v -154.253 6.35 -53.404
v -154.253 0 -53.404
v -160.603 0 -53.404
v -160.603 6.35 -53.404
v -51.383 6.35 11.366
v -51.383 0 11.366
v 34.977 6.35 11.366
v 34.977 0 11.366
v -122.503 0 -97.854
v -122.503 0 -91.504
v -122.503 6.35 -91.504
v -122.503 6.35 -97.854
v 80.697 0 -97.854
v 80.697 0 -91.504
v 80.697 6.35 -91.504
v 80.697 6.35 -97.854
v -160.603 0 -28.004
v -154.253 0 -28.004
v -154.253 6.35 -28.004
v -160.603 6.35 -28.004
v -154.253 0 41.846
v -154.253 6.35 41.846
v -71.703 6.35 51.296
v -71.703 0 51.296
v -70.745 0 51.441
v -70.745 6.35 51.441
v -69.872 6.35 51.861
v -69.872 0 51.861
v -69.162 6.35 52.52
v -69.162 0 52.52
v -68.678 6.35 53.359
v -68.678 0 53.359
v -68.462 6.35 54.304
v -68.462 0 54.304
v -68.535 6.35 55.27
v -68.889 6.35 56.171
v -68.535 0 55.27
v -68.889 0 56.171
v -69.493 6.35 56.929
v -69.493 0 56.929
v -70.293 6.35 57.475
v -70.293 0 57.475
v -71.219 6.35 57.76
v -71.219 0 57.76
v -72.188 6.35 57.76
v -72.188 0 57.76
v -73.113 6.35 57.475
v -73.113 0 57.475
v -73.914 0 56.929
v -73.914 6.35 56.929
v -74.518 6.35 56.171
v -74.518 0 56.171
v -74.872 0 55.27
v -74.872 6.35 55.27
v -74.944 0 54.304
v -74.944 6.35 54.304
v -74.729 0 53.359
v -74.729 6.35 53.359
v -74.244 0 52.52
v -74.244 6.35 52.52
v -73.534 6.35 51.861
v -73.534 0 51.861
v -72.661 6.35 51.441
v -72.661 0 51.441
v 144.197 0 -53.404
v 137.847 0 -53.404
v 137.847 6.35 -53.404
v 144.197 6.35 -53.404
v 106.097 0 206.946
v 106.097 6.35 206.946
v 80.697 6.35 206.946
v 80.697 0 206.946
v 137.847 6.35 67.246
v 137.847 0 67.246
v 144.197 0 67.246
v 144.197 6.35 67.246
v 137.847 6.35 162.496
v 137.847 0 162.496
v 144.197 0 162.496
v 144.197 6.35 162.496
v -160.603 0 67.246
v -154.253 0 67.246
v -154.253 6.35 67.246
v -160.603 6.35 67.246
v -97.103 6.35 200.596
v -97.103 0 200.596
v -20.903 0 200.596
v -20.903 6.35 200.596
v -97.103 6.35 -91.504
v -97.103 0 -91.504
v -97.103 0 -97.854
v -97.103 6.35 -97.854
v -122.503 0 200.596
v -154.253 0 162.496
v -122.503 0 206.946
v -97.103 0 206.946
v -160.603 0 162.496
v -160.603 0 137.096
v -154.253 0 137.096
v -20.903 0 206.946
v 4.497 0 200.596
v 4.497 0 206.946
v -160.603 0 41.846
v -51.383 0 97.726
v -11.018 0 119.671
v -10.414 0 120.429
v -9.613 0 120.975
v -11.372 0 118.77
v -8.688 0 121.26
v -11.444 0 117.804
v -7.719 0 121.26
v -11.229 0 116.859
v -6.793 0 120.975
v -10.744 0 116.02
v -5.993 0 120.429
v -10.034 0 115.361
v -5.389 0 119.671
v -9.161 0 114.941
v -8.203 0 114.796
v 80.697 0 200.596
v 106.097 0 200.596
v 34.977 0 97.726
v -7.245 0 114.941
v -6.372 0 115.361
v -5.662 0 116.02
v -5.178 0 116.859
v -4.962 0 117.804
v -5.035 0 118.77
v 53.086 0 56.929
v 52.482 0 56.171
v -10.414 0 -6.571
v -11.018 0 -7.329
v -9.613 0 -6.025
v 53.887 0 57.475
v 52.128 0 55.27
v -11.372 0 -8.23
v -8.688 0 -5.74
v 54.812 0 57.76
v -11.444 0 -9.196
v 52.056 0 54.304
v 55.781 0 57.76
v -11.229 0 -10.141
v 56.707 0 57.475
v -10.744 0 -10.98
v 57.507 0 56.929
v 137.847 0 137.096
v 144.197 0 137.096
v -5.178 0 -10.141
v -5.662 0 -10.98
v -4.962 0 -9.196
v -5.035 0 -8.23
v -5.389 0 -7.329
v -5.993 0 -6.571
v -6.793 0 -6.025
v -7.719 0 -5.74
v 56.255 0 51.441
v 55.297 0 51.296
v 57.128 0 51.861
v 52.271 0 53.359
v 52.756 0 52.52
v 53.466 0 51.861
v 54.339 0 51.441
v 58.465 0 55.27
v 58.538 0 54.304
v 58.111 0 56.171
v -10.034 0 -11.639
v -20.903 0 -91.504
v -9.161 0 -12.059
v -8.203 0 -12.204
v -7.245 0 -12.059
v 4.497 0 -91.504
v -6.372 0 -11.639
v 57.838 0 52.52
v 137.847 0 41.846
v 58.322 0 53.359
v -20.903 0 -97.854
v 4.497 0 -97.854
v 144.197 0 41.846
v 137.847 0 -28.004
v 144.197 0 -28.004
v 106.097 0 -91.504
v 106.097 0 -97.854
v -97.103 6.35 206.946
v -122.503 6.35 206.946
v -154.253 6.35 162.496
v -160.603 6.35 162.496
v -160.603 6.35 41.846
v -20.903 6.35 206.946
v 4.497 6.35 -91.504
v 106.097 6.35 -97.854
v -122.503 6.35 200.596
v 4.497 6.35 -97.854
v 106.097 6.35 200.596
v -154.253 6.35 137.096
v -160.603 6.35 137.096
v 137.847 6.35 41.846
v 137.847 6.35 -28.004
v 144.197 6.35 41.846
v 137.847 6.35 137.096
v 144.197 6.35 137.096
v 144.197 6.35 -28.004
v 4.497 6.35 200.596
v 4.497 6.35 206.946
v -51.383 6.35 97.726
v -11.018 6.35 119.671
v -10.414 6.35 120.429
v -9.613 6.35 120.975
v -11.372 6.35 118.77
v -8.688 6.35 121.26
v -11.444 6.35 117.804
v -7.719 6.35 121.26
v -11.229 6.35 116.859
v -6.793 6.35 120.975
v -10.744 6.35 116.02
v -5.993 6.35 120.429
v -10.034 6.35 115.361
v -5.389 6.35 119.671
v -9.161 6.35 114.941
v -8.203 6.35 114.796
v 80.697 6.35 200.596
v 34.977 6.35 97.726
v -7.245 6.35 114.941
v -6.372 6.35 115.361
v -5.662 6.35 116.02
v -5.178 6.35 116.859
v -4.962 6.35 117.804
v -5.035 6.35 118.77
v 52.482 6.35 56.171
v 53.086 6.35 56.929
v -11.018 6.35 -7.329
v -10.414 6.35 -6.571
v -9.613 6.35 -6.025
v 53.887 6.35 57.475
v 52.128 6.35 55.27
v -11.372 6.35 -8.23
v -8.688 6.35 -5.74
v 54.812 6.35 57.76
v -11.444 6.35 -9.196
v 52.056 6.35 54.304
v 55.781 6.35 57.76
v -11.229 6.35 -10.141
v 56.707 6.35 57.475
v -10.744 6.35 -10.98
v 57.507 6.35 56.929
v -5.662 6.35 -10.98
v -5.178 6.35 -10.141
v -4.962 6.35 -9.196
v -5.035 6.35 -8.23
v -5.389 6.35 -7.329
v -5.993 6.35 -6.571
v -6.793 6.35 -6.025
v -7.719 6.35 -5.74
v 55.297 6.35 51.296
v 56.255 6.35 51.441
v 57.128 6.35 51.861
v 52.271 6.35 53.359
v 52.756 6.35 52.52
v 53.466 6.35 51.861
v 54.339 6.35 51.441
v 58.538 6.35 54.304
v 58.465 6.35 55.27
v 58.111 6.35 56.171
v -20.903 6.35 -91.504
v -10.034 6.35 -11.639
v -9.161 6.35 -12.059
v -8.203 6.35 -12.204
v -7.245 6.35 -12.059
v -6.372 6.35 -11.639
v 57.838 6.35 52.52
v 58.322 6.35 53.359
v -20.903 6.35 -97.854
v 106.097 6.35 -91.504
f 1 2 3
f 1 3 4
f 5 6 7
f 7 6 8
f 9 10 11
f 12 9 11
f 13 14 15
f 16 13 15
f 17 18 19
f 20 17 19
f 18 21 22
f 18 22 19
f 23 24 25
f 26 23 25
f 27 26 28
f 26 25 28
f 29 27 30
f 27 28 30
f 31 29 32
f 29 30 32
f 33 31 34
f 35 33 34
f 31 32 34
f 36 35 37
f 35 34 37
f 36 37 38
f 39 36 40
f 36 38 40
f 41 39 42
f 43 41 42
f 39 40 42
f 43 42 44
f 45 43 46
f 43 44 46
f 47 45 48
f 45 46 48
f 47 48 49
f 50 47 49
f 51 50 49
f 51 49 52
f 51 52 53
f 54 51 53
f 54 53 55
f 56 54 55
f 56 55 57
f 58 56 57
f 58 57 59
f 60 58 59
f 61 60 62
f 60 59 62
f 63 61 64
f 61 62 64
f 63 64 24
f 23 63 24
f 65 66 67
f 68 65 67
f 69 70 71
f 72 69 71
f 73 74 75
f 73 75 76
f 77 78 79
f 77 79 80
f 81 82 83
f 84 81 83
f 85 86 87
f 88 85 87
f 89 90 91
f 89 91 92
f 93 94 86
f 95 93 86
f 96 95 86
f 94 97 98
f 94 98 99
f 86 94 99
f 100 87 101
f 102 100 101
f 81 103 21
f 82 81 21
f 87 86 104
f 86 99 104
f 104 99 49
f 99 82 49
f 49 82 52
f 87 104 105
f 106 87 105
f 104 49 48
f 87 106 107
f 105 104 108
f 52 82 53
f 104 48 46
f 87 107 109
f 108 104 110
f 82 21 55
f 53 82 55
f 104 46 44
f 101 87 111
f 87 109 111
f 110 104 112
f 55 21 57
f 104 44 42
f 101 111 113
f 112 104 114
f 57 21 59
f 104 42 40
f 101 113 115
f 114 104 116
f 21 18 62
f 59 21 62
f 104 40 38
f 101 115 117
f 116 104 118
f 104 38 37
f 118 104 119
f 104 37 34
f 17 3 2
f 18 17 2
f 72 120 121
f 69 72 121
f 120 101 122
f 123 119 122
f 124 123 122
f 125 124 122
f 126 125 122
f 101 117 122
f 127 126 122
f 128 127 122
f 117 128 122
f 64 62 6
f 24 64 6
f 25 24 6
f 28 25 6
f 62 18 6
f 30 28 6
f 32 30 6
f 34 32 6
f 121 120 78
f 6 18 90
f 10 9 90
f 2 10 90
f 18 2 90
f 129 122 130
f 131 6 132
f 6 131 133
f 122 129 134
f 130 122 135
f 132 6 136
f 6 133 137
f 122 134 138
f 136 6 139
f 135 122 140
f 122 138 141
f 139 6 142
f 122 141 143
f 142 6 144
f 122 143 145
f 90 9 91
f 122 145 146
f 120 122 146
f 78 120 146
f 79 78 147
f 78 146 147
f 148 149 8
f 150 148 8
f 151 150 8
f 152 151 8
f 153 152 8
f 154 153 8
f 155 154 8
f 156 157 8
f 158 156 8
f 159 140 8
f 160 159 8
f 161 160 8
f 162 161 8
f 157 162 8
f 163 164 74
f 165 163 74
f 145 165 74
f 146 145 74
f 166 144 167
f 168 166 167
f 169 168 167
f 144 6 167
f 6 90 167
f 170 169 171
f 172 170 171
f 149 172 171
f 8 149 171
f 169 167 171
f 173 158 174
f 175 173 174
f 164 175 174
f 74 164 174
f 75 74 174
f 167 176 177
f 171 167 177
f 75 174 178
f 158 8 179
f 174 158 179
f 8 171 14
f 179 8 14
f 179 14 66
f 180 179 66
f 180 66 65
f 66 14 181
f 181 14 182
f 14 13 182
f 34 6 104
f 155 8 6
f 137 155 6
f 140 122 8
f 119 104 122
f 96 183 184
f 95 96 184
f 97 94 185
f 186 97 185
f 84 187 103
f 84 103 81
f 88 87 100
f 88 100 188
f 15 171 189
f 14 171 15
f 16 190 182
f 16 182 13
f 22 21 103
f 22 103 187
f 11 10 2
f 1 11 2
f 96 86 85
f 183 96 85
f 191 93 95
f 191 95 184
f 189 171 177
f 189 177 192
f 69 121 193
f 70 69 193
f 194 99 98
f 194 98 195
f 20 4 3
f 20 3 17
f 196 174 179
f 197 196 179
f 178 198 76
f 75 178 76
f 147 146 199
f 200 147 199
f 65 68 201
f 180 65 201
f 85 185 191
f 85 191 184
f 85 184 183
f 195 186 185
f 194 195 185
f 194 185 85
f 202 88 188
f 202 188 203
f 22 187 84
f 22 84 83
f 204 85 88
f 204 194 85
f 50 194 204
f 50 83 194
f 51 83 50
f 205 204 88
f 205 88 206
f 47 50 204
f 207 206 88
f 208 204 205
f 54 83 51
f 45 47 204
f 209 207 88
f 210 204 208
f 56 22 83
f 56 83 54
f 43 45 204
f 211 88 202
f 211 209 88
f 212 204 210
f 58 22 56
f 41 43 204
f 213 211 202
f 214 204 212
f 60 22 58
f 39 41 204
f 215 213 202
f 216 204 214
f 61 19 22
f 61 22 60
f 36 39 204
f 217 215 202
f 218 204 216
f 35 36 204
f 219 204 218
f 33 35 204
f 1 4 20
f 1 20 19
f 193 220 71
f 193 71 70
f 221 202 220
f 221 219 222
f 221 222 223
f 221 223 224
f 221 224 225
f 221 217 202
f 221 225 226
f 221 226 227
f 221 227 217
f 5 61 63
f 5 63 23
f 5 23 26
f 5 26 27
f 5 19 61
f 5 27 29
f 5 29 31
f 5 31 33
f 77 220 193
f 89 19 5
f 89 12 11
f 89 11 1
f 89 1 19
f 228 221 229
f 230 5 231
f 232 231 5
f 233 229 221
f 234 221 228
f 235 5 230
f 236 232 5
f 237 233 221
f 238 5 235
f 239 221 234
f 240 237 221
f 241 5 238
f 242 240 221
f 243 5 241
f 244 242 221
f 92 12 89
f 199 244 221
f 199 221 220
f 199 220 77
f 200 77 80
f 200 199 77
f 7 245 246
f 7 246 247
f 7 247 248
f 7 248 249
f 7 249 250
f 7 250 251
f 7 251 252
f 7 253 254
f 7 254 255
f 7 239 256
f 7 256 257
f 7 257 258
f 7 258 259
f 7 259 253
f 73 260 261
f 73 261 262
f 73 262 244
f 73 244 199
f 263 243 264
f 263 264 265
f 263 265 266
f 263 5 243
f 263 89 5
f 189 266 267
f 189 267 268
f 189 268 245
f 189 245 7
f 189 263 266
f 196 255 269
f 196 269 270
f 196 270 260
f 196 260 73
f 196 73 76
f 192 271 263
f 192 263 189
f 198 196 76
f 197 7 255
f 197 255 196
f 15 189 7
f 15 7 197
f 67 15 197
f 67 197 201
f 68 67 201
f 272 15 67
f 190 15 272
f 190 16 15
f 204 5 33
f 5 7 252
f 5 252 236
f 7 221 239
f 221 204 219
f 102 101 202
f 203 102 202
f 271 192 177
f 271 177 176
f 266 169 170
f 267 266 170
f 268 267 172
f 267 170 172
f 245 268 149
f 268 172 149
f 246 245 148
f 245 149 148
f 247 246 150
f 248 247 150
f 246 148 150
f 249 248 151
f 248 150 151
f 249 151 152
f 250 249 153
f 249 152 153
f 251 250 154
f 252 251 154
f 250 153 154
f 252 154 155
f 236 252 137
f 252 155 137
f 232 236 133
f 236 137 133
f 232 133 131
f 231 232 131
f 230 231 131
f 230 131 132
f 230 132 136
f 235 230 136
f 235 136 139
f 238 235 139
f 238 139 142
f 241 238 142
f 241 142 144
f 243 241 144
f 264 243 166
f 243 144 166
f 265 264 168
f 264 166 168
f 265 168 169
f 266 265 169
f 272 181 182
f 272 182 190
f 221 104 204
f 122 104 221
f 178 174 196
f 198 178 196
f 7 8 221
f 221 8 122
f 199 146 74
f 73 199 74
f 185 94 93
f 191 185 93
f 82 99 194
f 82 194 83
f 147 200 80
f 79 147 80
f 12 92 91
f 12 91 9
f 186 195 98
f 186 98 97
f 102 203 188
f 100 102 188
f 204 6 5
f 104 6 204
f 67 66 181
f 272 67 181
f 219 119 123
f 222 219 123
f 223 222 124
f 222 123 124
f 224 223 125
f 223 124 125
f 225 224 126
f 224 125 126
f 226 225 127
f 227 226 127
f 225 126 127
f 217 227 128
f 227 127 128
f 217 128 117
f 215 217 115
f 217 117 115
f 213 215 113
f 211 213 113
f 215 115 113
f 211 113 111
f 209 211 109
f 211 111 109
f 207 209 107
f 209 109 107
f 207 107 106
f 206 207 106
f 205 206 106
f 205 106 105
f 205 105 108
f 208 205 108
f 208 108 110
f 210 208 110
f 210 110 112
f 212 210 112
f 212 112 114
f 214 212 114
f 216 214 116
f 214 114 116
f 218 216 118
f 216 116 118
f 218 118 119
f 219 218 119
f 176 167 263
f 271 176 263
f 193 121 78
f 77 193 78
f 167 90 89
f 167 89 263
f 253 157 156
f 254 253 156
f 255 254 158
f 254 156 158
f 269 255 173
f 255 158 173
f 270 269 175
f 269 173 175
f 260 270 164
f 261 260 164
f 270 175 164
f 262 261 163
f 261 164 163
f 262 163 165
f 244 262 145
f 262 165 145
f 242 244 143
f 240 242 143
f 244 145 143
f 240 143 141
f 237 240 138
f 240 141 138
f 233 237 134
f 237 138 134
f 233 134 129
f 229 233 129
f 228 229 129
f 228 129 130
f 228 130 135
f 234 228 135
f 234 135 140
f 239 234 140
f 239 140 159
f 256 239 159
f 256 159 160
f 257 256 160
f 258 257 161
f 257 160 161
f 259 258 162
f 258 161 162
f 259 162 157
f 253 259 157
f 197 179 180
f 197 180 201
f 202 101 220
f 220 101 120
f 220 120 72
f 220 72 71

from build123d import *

# Parameters (mm, degrees)
SKETCH1_W           = 292.1
SKETCH1_H           = 292.1
BOSS_EXTRUDE1_DEPTH = 6.35
SKETCH3_W           = 25.4
SKETCH3_H           = 6.35
BOSS_EXTRUDE2_DEPTH = 6.35
SKETCH4_W           = 25.4
SKETCH4_H           = 6.35
BOSS_EXTRUDE3_DEPTH = 6.35
SKETCH5_R           = 3.25
SKETCH5_W           = 86.36
SKETCH5_H           = 86.36
CUT_EXTRUDE1_DEPTH  = 6.35


with BuildPart() as part:
    # Sketch1 → Boss-Extrude1 (new body)
    with BuildSketch(Plane(origin=(0, 0, 0), x_dir=(1, 0, 0), z_dir=(0, 1, 0))):
        with Locations((-8.203162495, -54.546418503)):
            Rectangle(SKETCH1_W, SKETCH1_H)
    extrude(amount=BOSS_EXTRUDE1_DEPTH)

    # Sketch3 → Boss-Extrude2 (add)
    with BuildSketch(Plane.ZY.offset(154.253162495)):
        with Locations((-40.703581497, 3.175)):
            Rectangle(SKETCH3_W, SKETCH3_H)
        with Locations((149.796418503, 3.175)):
            Rectangle(SKETCH3_W, SKETCH3_H)
        with Locations((54.546418503, 3.175)):
            Rectangle(SKETCH3_W, SKETCH3_H)
    boss_extrude2 = extrude(amount=BOSS_EXTRUDE2_DEPTH)

    # Mirror1: Boss-Extrude2 across plane
    add(boss_extrude2.mirror(Plane.ZY.offset(8.203162495)))

    # Sketch4 → Boss-Extrude3 (add)
    with BuildSketch(Plane(origin=(0, 0, -91.503581497), x_dir=(-1, 0, 0), z_dir=(0, 0, -1))):
        with Locations((-93.396837505, 3.175)):
            Rectangle(SKETCH4_W, SKETCH4_H)
        with Locations((109.803162495, 3.175)):
            Rectangle(SKETCH4_W, SKETCH4_H)
        with Locations((8.203162495, 3.175)):
            Rectangle(SKETCH4_W, SKETCH4_H)
    boss_extrude3 = extrude(amount=BOSS_EXTRUDE3_DEPTH)

    # Mirror2: Boss-Extrude3 across plane
    add(boss_extrude3.mirror(Plane.XY.offset(54.546418503)))

    # Sketch5 → Cut-Extrude1 (cut)
    with BuildSketch(Plane.XZ):
        with Locations(Location((-8.203162495, 118.046418503, 0), (0, 0, 270))):
            Circle(SKETCH5_R)
        with Locations(Location((55.296837505, 54.546418503, 0), (0, 0, 270))):
            Circle(SKETCH5_R)
        with Locations(Location((-8.203162495, -8.953581497, 0), (0, 0, 270))):
            Circle(SKETCH5_R)
        with Locations(Location((-71.703162495, 54.546418503, 0), (0, 0, 270))):
            Circle(SKETCH5_R)
        with Locations((-8.203162495, 54.546418503)):
            Rectangle(SKETCH5_W, SKETCH5_H)
        Polygon((106.096837505, 200.596418503), (137.846837505, 162.496418503), (137.846837505, 200.596418503), align=None)
        Polygon((-122.503162495, 200.596418503), (-154.253162495, 200.596418503), (-154.253162495, 162.496418503), align=None)
        Polygon((-154.253162495, -53.403581497), (-154.253162495, -91.503581497), (-122.503162495, -91.503581497), align=None)
        Polygon((106.096837505, -91.503581497), (137.846837505, -91.503581497), (137.846837505, -53.403581497), align=None)
    extrude(amount=-CUT_EXTRUDE1_DEPTH, mode=Mode.SUBTRACT)


solid = part.part
